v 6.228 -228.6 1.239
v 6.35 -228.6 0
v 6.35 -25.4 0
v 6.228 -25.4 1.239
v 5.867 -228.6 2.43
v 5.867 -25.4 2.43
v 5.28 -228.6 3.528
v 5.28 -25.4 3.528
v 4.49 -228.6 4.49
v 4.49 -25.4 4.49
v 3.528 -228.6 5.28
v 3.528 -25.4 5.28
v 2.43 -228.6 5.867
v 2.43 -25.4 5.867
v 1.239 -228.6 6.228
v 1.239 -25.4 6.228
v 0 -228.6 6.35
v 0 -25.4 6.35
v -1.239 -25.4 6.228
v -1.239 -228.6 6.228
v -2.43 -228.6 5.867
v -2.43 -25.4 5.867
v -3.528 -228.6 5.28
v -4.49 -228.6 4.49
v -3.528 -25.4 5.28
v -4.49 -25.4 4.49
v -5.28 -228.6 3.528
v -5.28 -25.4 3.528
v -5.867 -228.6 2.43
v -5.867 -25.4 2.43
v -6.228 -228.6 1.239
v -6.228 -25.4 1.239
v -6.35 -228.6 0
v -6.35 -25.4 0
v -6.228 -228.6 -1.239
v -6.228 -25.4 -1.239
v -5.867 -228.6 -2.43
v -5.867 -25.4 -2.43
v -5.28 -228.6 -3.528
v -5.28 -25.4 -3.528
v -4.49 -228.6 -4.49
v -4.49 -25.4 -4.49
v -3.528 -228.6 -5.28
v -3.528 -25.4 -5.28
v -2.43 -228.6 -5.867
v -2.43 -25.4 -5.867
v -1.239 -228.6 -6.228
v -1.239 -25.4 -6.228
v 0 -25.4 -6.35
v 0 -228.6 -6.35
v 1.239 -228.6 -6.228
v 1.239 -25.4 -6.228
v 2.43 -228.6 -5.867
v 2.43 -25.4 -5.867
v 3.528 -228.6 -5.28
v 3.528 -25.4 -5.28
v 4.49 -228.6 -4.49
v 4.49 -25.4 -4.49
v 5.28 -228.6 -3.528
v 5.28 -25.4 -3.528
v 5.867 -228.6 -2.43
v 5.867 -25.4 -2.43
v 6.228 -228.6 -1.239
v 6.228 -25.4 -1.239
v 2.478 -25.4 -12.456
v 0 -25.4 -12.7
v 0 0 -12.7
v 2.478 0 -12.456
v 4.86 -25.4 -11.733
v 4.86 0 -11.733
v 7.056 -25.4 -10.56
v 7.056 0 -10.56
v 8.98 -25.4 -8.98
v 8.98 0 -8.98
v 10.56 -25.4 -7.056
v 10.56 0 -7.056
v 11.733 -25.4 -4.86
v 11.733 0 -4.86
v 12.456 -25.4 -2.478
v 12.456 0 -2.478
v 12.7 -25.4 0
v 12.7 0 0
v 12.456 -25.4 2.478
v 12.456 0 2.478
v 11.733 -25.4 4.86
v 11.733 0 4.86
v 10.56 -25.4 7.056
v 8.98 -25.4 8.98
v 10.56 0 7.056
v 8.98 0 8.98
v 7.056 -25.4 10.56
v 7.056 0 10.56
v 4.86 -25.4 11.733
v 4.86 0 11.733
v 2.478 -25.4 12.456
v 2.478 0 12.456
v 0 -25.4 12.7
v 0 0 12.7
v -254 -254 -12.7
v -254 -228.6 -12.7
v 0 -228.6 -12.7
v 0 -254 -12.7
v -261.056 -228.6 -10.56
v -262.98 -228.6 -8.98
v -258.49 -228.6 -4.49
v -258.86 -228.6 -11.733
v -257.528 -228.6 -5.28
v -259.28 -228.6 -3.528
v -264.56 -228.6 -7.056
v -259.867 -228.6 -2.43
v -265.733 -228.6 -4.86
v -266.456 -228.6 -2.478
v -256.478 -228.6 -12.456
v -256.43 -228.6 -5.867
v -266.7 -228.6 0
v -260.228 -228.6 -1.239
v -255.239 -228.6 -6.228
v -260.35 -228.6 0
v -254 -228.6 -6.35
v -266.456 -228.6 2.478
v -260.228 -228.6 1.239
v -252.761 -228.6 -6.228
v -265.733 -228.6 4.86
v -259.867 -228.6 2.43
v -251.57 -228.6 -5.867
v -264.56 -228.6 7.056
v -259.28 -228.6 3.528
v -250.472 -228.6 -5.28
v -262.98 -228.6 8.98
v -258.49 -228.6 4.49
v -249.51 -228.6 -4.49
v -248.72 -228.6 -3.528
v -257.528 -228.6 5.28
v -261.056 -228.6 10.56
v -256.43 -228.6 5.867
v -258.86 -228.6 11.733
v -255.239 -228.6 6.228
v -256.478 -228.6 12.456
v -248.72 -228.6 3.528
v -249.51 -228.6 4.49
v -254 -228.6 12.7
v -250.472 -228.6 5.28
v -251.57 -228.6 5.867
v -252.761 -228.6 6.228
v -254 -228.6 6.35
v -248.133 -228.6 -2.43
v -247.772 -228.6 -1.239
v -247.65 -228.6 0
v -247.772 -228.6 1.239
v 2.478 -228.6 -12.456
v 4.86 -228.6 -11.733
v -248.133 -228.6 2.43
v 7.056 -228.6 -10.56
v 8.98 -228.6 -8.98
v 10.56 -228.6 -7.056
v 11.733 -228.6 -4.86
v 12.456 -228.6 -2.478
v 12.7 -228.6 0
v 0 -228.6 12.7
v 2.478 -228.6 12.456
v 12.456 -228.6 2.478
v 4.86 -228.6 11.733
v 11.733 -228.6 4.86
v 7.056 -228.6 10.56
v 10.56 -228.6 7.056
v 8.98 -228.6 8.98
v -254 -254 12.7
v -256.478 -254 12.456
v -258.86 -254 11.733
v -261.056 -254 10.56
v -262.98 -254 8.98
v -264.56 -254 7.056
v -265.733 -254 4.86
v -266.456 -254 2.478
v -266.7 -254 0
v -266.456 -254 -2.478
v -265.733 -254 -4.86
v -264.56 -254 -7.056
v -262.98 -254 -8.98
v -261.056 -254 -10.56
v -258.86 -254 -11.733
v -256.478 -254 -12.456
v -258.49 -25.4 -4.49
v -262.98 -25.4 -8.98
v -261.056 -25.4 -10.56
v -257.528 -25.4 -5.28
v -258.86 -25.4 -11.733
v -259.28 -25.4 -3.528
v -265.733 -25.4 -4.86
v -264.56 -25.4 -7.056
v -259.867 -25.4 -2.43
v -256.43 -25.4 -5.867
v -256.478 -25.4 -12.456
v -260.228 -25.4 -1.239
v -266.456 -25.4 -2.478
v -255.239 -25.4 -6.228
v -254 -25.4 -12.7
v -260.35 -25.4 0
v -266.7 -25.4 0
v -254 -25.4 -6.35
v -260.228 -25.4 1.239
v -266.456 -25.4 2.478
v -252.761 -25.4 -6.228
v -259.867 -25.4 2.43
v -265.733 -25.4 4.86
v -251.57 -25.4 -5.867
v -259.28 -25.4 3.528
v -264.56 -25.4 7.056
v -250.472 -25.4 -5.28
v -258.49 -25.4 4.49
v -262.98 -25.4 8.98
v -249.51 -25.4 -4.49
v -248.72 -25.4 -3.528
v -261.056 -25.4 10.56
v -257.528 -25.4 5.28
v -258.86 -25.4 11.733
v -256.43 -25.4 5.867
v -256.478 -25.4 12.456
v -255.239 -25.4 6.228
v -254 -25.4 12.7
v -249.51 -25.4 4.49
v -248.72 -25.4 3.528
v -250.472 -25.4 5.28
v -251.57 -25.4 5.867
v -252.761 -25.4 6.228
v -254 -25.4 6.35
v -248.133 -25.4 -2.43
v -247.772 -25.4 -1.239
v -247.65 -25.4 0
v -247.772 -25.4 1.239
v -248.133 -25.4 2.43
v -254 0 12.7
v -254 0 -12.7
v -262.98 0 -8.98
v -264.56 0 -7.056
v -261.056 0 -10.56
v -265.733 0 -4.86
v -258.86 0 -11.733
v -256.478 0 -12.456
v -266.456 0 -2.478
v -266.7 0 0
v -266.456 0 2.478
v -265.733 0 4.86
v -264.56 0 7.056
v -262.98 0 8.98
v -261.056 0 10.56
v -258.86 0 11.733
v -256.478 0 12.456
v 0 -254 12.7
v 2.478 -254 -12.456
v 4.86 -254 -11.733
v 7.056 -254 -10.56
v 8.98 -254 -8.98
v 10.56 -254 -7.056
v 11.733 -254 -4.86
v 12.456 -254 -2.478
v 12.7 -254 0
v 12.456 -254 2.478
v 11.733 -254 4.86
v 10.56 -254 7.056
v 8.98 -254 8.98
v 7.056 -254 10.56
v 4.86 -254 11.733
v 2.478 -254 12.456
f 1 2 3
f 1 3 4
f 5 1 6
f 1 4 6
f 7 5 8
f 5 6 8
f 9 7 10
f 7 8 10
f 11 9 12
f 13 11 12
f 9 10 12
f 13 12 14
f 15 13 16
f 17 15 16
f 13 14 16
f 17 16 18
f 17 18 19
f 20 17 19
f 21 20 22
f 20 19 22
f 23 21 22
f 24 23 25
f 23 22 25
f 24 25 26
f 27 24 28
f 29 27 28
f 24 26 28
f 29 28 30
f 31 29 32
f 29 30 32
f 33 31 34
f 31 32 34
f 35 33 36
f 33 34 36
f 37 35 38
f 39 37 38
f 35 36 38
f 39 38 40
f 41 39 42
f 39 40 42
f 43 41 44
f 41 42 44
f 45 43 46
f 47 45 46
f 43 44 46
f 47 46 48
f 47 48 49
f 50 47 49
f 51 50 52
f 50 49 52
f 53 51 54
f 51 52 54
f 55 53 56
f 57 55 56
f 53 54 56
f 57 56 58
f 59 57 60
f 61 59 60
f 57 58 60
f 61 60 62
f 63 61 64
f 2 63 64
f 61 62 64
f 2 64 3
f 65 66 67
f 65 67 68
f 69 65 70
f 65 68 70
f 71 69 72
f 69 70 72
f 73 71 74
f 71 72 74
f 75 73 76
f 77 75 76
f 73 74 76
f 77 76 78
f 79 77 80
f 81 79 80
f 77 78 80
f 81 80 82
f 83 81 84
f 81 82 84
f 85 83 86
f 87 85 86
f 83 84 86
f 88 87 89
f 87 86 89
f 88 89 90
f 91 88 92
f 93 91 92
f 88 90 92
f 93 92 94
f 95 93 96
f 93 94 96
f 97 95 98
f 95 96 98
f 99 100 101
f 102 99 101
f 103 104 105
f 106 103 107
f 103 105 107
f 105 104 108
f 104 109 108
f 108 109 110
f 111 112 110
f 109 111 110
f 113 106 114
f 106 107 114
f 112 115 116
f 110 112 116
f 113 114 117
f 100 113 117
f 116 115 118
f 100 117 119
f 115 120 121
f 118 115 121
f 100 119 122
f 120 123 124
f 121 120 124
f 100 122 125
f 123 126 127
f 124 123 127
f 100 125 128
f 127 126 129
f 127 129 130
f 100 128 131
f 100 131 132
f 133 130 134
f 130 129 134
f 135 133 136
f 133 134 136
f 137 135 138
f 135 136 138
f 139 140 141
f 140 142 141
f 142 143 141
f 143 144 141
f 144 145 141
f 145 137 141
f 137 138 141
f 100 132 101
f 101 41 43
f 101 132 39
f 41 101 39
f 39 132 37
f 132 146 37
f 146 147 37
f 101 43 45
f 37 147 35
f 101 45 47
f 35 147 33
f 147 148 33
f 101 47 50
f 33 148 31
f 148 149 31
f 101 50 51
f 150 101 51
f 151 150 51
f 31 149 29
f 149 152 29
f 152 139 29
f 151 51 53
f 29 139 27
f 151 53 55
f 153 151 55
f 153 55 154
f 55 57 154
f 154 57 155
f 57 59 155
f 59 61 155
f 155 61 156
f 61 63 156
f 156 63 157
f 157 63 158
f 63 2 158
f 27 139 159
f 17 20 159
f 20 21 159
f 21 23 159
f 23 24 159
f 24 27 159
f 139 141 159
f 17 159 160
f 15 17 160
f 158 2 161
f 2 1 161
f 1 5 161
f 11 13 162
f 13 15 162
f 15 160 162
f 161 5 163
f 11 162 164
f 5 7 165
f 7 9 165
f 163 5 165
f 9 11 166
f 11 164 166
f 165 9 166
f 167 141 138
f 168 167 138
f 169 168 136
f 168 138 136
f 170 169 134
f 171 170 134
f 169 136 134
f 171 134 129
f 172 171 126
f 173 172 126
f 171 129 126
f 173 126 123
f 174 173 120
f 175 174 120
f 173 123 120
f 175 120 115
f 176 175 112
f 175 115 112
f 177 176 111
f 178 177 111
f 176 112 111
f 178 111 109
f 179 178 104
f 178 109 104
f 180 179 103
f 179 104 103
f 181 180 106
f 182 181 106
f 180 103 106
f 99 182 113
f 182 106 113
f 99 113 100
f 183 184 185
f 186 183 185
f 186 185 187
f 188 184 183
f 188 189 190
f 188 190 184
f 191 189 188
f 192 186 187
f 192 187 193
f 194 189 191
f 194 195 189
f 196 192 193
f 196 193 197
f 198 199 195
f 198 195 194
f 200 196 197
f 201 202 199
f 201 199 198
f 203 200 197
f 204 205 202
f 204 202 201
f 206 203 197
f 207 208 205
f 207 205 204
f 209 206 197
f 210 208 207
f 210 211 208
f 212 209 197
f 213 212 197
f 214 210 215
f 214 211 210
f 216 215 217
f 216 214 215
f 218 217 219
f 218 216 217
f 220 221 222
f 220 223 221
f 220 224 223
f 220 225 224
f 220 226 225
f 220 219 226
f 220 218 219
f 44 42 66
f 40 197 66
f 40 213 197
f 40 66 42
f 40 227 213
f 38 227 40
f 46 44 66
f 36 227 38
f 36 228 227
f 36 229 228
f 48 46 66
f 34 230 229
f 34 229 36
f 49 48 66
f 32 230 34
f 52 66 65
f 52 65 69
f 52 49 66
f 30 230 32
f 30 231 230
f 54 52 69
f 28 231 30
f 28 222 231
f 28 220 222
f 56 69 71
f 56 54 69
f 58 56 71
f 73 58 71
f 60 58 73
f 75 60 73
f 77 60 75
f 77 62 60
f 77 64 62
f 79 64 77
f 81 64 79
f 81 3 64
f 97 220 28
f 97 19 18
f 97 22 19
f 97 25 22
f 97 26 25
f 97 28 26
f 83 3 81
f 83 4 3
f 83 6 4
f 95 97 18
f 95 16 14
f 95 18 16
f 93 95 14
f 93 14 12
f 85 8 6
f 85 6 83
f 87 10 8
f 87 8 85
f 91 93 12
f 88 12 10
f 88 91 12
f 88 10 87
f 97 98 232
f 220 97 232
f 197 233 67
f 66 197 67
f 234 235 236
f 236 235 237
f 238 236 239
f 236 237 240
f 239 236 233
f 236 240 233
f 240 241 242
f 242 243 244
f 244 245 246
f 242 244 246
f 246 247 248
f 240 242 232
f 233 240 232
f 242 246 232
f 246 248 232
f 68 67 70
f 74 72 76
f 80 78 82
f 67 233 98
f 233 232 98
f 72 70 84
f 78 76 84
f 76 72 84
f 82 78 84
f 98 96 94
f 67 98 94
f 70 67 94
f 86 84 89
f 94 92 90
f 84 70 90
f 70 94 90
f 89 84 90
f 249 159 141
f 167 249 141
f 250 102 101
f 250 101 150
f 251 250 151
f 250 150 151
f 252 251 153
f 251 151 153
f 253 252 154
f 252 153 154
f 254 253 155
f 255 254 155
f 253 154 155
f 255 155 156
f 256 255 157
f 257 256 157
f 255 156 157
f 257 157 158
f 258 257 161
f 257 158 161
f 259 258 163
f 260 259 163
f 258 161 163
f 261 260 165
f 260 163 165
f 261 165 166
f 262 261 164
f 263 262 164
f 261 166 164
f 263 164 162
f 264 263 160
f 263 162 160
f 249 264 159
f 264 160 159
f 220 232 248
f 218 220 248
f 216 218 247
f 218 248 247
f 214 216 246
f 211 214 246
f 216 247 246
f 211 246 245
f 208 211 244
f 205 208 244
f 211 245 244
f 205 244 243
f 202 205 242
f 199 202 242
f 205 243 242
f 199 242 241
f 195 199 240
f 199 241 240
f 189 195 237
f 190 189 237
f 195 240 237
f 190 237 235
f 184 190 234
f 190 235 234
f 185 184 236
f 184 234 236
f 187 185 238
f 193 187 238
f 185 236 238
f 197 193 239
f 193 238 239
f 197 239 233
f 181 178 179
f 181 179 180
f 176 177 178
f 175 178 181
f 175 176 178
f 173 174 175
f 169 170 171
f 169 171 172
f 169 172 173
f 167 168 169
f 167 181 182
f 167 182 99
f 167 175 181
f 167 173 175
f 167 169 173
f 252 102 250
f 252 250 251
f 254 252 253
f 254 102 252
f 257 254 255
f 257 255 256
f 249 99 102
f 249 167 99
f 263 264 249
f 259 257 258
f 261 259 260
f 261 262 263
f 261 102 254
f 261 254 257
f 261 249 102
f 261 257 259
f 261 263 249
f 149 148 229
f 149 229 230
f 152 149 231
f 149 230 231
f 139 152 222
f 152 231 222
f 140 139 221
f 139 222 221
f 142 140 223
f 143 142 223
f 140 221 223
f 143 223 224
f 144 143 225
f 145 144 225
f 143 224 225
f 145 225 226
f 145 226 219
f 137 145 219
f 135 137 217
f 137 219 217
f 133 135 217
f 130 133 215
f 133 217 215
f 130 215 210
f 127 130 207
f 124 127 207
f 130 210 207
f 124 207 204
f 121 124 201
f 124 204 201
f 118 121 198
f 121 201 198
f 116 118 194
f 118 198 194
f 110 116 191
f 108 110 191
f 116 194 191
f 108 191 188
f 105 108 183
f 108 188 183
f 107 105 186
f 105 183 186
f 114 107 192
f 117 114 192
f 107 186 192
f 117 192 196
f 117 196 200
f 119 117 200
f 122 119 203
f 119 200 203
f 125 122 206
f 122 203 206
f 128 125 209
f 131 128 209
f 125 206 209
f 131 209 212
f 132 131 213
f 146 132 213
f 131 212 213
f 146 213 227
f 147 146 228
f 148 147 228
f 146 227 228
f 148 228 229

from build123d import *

# Parameters (mm, degrees)
F1_DEPTH = 25.4
F2_R     = 6.35
F3_DEPTH = 203.2
F4_R     = 6.35
F5_DEPTH = 25.4


with BuildPart() as f1:
    # F0 (on Front) → F1 (new body)
    with BuildSketch(Plane.XZ):
        with BuildLine():
            Line((-254, -12.7), (0, -12.7))
            ThreePointArc((0, -12.7), (12.7, 0), (0, 12.7))
            Line((0, 12.7), (-254, 12.7))
            ThreePointArc((-254, 12.7), (-266.7, 0), (-254, -12.7))
        make_face()
    extrude(amount=F1_DEPTH)

    # F2 (on face) → F3 (join)
    with BuildSketch(Plane.XZ.offset(25.4)):
        with Locations((-254, 0)):
            Circle(F2_R)
        Circle(F2_R)
    extrude(amount=F3_DEPTH)

    # F4 (on face) → F5 (join)
    with BuildSketch(Plane.XZ.offset(228.6)):
        with BuildLine():
            Line((0, 12.7), (-254, 12.7))
            ThreePointArc((-254, 12.7), (-266.7, 0), (-254, -12.7))
            Line((-254, -12.7), (0, -12.7))
            ThreePointArc((0, -12.7), (12.7, 0), (0, 12.7))
        make_face()
        with Locations((-254, 0)):
            Circle(F4_R)
    extrude(amount=F5_DEPTH)


solid = f1.part
